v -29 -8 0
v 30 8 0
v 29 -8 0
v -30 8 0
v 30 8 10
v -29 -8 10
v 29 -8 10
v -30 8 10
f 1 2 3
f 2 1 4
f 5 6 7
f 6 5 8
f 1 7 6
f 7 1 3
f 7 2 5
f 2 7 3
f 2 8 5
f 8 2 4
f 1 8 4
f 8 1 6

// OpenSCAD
// Rectangular shaft key with chamfered ends.
$fn = 60;
eps = 0.02;
key_w = 16;
key_h = 10;
key_l = 60;
chamfer = 1;
polyhedron(points = [
    [-key_l / 2 + chamfer, -key_w / 2, 0], [key_l / 2 - chamfer, -key_w / 2, 0], [key_l / 2, key_w / 2, 0], [-key_l / 2, key_w / 2, 0],
    [-key_l / 2 + chamfer, -key_w / 2, key_h], [key_l / 2 - chamfer, -key_w / 2, key_h], [key_l / 2, key_w / 2, key_h], [-key_l / 2, key_w / 2, key_h]
], faces = [[0,1,2,3],[4,7,6,5],[0,4,5,1],[1,5,6,2],[2,6,7,3],[3,7,4,0]]);
